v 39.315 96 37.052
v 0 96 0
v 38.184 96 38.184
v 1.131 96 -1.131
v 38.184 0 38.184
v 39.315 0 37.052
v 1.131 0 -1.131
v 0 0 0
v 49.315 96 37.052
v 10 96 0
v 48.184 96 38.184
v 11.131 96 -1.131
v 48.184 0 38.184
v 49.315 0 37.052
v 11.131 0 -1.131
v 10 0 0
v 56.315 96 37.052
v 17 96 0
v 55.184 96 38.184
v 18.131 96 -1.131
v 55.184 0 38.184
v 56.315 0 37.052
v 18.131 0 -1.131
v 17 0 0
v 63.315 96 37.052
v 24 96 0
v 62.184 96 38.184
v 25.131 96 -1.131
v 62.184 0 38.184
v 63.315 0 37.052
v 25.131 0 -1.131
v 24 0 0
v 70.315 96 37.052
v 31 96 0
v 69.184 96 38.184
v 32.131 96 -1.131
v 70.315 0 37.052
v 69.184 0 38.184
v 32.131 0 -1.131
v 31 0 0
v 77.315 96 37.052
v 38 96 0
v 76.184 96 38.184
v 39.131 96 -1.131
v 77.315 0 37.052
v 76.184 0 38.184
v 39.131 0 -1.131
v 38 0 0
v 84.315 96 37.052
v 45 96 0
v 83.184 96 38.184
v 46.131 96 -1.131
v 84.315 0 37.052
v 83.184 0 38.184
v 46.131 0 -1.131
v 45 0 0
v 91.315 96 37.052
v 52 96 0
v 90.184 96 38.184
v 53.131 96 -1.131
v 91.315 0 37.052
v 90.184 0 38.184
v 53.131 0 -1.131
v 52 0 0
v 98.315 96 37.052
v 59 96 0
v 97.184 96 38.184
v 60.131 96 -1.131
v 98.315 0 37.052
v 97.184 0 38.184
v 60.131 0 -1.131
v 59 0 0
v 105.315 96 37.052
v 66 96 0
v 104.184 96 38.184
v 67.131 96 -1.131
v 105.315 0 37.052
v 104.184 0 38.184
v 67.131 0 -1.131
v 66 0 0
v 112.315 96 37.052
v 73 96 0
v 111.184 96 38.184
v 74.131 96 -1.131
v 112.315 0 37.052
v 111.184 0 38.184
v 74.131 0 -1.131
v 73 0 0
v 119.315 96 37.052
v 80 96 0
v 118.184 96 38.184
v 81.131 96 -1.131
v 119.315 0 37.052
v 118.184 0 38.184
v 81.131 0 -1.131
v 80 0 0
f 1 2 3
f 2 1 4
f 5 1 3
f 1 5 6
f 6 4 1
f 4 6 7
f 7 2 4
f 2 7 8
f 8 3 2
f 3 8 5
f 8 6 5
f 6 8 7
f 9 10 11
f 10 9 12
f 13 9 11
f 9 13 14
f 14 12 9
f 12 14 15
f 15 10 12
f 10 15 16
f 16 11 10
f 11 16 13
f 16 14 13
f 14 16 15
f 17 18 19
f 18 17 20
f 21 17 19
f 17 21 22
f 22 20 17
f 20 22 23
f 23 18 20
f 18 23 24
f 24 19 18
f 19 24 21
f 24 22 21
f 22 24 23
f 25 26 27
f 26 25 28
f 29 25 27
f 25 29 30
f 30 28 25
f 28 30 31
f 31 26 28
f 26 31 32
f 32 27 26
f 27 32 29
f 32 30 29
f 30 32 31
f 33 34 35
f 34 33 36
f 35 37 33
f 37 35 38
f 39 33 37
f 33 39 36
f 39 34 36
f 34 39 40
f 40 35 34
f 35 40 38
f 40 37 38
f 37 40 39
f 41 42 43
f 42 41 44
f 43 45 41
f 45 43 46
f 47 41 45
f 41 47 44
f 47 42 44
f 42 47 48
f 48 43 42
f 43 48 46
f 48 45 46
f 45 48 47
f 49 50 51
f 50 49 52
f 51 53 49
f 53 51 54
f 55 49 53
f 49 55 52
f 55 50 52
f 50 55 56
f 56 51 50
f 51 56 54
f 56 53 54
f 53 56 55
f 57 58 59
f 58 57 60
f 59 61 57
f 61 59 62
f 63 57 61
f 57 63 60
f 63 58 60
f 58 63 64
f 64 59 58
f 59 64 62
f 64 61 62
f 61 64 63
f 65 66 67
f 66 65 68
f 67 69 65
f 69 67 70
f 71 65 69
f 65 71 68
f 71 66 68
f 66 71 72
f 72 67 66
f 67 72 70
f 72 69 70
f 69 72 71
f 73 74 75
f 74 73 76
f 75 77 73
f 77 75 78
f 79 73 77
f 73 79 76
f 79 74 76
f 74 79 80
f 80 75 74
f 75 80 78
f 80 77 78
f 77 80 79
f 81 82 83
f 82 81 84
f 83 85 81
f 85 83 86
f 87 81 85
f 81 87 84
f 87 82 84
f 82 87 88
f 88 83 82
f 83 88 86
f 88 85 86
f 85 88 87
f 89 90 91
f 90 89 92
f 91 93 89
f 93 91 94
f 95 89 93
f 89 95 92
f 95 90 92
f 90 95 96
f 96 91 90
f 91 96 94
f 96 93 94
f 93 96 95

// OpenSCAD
// Innovation 3rd Edition
//
// by W. Craig Trader is dual-licensed under 
// Creative Commons Attribution-ShareAlike 3.0 Unported License and
// GNU Lesser GPL 3.0 or later.

include <MCAD/units.scad>;

// Physical dimensions
WALL = 0.8 * mm; // Slicing filament thickness
GAP  = 0.2 * mm; // Size differential between box and lid, for snug fit
POKE_HOLE = 20 * mm; // Diameter of poke holes in bottom
BOTTOM = 1 * mm;

// Tile dimensions
CARD_WIDTH = 69 * mm;       // (X) Width of card
CARD_HEIGHT = 96 * mm;      // (Y) Height of card
DECK_THICKNESS = 30 * mm;   // (Z) Thickness of card stack

BOARD_WIDTH = 128 * mm;     // (X) Width of player board
BOARD_HEIGHT = 89 * mm;     // (Y) Height of player board

RULES_WIDTH = 117 * mm;     // (X) Width of rule book
RULES_HEIGHT = 85 * mm;     // (Y) Height of rule book

EXTRA_THICKNESS = 3 * mm;   // (Z) Thickness of rules and boards

// Wall dimensions
OUTER  = 2 * WALL;
INNER  = 2 * WALL;
SEP    = 2 * WALL;

OVERLAP = 0.1 * mm; // Ensures that there are no vertical artifacts leftover

// $fa=4;
$fn = 36;

box_height = DECK_THICKNESS;
lid_height = ceil( max( EXTRA_THICKNESS, 5 * mm ) );

SIZES = [ 10, 7, 7, 7, 7, 7, 7, 7, 7, 7, 7 ];
STEPS = [ 0, 10, 17, 24, 31, 38, 45, 52, 59, 66, 73, 80 ];

//width = ceil( max( CARD_HEIGHT, BOARD_HEIGHT, RULES_HEIGHT ) );
//length = 2*INNER + 1*SEP + s1 + s2;
//height = 2*INNER + width;
for( dx = STEPS ) {
    translate( [ dx, 0, 0 ] )
        rotate( [0, 45, 0]) 
            cube( [ SEP, CARD_HEIGHT, CARD_WIDTH-15 ] );
}
